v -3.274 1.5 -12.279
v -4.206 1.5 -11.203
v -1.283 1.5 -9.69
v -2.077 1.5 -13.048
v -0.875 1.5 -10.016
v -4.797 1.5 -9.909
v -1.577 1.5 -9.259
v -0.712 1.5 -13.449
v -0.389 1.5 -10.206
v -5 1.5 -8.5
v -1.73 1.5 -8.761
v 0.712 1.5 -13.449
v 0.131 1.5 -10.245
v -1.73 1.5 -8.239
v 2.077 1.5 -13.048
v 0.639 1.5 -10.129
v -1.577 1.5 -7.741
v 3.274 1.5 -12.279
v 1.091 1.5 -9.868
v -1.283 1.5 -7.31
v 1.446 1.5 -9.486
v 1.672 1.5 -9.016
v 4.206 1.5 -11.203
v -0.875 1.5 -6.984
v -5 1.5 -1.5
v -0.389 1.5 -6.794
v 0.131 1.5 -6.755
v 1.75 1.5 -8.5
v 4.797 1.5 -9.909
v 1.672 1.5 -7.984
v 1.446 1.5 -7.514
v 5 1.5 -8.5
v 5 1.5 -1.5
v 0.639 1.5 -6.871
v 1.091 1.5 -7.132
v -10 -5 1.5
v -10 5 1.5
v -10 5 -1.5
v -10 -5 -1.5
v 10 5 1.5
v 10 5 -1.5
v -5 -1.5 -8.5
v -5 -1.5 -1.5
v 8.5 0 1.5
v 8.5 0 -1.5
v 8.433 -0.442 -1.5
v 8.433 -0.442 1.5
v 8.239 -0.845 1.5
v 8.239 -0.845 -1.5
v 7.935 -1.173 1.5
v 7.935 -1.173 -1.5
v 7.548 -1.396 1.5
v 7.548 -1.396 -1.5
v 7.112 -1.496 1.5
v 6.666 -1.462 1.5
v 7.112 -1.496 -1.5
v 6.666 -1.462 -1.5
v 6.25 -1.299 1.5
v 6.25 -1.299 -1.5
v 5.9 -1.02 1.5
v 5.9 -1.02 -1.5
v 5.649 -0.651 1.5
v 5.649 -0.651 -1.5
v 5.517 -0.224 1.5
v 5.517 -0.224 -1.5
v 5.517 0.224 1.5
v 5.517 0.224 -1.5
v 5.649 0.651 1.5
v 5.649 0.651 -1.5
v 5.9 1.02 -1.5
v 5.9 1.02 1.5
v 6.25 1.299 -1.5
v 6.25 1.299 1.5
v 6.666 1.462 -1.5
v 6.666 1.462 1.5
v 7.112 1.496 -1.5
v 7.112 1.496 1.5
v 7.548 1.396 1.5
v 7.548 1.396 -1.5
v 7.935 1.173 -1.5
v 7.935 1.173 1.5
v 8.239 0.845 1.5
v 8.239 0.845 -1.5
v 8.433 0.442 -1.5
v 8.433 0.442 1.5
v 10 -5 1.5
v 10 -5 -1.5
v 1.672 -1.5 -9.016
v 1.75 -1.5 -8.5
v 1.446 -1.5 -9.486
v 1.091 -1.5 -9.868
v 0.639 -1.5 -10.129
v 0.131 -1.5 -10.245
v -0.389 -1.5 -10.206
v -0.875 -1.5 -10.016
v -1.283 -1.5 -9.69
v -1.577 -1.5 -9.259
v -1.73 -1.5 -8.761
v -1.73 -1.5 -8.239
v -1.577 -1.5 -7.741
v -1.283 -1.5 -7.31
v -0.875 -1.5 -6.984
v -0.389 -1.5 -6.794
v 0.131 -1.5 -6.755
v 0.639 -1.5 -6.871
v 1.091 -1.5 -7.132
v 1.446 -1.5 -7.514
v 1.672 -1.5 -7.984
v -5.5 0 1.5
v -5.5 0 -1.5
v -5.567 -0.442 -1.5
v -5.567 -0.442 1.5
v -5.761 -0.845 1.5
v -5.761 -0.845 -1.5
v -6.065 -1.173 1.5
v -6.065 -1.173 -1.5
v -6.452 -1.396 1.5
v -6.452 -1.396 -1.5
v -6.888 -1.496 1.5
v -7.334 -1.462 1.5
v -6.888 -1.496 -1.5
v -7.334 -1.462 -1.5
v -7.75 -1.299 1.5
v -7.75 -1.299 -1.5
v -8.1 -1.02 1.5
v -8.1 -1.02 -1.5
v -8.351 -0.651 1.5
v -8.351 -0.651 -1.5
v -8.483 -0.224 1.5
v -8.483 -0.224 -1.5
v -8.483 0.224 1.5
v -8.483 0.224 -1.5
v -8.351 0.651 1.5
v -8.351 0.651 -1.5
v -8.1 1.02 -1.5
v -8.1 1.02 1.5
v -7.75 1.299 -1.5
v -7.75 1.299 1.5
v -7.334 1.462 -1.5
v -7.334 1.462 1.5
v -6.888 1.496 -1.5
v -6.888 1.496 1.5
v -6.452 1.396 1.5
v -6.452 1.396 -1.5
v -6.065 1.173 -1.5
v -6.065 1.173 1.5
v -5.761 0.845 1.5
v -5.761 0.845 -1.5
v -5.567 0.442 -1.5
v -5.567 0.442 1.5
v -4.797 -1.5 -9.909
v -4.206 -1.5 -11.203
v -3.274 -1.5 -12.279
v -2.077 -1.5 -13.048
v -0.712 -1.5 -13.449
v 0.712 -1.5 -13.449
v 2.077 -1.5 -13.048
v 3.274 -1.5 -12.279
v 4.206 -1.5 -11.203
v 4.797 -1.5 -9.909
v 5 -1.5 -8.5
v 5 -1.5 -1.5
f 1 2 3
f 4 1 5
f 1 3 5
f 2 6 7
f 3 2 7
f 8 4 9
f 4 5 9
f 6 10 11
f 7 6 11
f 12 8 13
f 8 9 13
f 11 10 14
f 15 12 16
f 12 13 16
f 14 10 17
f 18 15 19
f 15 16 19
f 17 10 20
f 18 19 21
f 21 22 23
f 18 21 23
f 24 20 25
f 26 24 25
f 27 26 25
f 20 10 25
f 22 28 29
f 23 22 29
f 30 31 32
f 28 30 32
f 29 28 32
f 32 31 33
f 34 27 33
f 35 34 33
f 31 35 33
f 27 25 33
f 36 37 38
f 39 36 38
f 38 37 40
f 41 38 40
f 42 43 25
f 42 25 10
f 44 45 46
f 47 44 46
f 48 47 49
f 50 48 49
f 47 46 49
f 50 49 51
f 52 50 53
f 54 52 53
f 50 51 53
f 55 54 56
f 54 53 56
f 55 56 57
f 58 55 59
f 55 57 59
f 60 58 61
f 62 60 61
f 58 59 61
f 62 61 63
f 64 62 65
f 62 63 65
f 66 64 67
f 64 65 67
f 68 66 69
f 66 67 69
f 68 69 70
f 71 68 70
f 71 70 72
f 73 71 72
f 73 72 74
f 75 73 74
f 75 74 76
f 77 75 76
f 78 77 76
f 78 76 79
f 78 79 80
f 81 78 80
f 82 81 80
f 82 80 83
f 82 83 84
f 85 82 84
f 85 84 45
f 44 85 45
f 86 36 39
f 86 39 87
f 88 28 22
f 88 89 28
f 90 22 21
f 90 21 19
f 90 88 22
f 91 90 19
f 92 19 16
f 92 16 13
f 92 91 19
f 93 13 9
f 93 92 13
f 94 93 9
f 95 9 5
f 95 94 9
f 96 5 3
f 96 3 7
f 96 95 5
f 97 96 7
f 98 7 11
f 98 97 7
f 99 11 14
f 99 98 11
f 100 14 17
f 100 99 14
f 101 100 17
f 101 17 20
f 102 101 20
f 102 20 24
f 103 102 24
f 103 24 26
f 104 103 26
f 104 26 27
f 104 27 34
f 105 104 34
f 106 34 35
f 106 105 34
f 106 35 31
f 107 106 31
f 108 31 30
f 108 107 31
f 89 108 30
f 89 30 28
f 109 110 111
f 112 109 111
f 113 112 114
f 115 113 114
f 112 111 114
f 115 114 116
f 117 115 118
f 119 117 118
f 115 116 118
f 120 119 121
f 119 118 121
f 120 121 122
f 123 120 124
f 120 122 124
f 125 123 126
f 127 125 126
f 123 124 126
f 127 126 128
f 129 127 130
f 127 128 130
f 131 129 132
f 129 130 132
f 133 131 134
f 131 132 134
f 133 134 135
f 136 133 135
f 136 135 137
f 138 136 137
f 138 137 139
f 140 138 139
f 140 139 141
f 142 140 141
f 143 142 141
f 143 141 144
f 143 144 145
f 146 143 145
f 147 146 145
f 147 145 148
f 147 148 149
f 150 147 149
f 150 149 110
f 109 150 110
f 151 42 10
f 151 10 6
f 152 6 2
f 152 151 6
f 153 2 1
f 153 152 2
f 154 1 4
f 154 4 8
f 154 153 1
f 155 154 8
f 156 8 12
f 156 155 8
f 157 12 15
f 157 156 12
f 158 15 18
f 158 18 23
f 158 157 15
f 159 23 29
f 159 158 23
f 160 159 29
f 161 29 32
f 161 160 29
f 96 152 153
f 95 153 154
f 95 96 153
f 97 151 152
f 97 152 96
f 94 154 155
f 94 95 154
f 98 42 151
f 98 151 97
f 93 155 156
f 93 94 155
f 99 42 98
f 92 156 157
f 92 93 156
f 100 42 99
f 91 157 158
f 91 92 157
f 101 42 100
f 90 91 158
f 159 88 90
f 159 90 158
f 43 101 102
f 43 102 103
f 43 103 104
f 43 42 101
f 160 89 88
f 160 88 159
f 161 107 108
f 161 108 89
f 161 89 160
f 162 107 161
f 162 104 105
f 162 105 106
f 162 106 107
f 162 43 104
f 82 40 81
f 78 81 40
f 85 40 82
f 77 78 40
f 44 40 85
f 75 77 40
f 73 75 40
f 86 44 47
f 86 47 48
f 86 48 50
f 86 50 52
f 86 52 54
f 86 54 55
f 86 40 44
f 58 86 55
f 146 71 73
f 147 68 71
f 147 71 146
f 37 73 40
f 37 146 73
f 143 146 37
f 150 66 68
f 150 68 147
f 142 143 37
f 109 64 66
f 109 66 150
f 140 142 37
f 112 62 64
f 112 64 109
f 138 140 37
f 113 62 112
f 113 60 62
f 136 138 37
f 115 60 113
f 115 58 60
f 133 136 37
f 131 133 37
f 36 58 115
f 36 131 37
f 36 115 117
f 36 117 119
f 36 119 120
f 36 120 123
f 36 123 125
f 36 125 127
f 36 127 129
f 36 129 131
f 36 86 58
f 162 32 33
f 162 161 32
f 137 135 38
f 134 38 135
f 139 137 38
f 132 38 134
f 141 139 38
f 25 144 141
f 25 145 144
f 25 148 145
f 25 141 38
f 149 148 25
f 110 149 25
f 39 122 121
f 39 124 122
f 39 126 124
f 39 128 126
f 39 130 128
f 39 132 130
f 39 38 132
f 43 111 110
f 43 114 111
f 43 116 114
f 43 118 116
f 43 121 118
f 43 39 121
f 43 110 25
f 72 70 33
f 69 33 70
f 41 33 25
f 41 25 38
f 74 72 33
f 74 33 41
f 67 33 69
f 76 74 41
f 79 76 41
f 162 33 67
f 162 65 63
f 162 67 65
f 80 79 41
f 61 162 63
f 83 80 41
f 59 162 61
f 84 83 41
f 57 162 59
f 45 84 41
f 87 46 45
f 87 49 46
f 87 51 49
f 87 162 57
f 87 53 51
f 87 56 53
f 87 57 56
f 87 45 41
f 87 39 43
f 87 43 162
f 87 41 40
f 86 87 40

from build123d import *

# Parameters (mm, degrees)
F1_DEPTH = 5
F2_DEPTH = 1.5
F3_R     = 1.5
F4_DEPTH = 3.001


with BuildPart() as f1:
    # F0 (on Front) → F1 (new body, symmetric)
    with BuildSketch(Plane.XZ):
        Polygon((5, -1.5), (10, -1.5), (10, 1.5), (-10, 1.5), (-10, -1.5), (-5, -1.5), (0, -1.5), align=None)
    extrude(amount=F1_DEPTH, both=True)

    # F0 (on Front) → F2 (join, symmetric)
    with BuildSketch(Plane.XZ):
        Polygon((5, -1.5), (10, -1.5), (10, 1.5), (-10, 1.5), (-10, -1.5), (-5, -1.5), (0, -1.5), align=None)
        with BuildLine():
            Line((5, -8.5), (5, -1.5))
            Line((5, -1.5), (0, -1.5))
            Line((0, -1.5), (-5, -1.5))
            Line((-5, -1.5), (-5, -8.5))
            Line((-5, -8.5), (-1.75, -8.5))
            ThreePointArc((-1.75, -8.5), (0, -6.75), (1.75, -8.5))
            Line((1.75, -8.5), (5, -8.5))
        make_face()
        with BuildLine():
            ThreePointArc((-5, -8.5), (0, -13.5), (5, -8.5))
            Line((5, -8.5), (1.75, -8.5))
            ThreePointArc((1.75, -8.5), (0, -10.25), (-1.75, -8.5))
            Line((-1.75, -8.5), (-5, -8.5))
        make_face()
    extrude(amount=F2_DEPTH, both=True)

    # F3 (on face) → F4 (cut, through all)
    with BuildSketch(Plane(origin=(0, 0, -1.5), x_dir=(1, 0, 0), z_dir=(0, 0, -1))):
        with Locations((-7, 0)):
            Circle(F3_R)
        with Locations((7, 0)):
            Circle(F3_R)
    extrude(amount=-F4_DEPTH, mode=Mode.SUBTRACT)


solid = f1.part
